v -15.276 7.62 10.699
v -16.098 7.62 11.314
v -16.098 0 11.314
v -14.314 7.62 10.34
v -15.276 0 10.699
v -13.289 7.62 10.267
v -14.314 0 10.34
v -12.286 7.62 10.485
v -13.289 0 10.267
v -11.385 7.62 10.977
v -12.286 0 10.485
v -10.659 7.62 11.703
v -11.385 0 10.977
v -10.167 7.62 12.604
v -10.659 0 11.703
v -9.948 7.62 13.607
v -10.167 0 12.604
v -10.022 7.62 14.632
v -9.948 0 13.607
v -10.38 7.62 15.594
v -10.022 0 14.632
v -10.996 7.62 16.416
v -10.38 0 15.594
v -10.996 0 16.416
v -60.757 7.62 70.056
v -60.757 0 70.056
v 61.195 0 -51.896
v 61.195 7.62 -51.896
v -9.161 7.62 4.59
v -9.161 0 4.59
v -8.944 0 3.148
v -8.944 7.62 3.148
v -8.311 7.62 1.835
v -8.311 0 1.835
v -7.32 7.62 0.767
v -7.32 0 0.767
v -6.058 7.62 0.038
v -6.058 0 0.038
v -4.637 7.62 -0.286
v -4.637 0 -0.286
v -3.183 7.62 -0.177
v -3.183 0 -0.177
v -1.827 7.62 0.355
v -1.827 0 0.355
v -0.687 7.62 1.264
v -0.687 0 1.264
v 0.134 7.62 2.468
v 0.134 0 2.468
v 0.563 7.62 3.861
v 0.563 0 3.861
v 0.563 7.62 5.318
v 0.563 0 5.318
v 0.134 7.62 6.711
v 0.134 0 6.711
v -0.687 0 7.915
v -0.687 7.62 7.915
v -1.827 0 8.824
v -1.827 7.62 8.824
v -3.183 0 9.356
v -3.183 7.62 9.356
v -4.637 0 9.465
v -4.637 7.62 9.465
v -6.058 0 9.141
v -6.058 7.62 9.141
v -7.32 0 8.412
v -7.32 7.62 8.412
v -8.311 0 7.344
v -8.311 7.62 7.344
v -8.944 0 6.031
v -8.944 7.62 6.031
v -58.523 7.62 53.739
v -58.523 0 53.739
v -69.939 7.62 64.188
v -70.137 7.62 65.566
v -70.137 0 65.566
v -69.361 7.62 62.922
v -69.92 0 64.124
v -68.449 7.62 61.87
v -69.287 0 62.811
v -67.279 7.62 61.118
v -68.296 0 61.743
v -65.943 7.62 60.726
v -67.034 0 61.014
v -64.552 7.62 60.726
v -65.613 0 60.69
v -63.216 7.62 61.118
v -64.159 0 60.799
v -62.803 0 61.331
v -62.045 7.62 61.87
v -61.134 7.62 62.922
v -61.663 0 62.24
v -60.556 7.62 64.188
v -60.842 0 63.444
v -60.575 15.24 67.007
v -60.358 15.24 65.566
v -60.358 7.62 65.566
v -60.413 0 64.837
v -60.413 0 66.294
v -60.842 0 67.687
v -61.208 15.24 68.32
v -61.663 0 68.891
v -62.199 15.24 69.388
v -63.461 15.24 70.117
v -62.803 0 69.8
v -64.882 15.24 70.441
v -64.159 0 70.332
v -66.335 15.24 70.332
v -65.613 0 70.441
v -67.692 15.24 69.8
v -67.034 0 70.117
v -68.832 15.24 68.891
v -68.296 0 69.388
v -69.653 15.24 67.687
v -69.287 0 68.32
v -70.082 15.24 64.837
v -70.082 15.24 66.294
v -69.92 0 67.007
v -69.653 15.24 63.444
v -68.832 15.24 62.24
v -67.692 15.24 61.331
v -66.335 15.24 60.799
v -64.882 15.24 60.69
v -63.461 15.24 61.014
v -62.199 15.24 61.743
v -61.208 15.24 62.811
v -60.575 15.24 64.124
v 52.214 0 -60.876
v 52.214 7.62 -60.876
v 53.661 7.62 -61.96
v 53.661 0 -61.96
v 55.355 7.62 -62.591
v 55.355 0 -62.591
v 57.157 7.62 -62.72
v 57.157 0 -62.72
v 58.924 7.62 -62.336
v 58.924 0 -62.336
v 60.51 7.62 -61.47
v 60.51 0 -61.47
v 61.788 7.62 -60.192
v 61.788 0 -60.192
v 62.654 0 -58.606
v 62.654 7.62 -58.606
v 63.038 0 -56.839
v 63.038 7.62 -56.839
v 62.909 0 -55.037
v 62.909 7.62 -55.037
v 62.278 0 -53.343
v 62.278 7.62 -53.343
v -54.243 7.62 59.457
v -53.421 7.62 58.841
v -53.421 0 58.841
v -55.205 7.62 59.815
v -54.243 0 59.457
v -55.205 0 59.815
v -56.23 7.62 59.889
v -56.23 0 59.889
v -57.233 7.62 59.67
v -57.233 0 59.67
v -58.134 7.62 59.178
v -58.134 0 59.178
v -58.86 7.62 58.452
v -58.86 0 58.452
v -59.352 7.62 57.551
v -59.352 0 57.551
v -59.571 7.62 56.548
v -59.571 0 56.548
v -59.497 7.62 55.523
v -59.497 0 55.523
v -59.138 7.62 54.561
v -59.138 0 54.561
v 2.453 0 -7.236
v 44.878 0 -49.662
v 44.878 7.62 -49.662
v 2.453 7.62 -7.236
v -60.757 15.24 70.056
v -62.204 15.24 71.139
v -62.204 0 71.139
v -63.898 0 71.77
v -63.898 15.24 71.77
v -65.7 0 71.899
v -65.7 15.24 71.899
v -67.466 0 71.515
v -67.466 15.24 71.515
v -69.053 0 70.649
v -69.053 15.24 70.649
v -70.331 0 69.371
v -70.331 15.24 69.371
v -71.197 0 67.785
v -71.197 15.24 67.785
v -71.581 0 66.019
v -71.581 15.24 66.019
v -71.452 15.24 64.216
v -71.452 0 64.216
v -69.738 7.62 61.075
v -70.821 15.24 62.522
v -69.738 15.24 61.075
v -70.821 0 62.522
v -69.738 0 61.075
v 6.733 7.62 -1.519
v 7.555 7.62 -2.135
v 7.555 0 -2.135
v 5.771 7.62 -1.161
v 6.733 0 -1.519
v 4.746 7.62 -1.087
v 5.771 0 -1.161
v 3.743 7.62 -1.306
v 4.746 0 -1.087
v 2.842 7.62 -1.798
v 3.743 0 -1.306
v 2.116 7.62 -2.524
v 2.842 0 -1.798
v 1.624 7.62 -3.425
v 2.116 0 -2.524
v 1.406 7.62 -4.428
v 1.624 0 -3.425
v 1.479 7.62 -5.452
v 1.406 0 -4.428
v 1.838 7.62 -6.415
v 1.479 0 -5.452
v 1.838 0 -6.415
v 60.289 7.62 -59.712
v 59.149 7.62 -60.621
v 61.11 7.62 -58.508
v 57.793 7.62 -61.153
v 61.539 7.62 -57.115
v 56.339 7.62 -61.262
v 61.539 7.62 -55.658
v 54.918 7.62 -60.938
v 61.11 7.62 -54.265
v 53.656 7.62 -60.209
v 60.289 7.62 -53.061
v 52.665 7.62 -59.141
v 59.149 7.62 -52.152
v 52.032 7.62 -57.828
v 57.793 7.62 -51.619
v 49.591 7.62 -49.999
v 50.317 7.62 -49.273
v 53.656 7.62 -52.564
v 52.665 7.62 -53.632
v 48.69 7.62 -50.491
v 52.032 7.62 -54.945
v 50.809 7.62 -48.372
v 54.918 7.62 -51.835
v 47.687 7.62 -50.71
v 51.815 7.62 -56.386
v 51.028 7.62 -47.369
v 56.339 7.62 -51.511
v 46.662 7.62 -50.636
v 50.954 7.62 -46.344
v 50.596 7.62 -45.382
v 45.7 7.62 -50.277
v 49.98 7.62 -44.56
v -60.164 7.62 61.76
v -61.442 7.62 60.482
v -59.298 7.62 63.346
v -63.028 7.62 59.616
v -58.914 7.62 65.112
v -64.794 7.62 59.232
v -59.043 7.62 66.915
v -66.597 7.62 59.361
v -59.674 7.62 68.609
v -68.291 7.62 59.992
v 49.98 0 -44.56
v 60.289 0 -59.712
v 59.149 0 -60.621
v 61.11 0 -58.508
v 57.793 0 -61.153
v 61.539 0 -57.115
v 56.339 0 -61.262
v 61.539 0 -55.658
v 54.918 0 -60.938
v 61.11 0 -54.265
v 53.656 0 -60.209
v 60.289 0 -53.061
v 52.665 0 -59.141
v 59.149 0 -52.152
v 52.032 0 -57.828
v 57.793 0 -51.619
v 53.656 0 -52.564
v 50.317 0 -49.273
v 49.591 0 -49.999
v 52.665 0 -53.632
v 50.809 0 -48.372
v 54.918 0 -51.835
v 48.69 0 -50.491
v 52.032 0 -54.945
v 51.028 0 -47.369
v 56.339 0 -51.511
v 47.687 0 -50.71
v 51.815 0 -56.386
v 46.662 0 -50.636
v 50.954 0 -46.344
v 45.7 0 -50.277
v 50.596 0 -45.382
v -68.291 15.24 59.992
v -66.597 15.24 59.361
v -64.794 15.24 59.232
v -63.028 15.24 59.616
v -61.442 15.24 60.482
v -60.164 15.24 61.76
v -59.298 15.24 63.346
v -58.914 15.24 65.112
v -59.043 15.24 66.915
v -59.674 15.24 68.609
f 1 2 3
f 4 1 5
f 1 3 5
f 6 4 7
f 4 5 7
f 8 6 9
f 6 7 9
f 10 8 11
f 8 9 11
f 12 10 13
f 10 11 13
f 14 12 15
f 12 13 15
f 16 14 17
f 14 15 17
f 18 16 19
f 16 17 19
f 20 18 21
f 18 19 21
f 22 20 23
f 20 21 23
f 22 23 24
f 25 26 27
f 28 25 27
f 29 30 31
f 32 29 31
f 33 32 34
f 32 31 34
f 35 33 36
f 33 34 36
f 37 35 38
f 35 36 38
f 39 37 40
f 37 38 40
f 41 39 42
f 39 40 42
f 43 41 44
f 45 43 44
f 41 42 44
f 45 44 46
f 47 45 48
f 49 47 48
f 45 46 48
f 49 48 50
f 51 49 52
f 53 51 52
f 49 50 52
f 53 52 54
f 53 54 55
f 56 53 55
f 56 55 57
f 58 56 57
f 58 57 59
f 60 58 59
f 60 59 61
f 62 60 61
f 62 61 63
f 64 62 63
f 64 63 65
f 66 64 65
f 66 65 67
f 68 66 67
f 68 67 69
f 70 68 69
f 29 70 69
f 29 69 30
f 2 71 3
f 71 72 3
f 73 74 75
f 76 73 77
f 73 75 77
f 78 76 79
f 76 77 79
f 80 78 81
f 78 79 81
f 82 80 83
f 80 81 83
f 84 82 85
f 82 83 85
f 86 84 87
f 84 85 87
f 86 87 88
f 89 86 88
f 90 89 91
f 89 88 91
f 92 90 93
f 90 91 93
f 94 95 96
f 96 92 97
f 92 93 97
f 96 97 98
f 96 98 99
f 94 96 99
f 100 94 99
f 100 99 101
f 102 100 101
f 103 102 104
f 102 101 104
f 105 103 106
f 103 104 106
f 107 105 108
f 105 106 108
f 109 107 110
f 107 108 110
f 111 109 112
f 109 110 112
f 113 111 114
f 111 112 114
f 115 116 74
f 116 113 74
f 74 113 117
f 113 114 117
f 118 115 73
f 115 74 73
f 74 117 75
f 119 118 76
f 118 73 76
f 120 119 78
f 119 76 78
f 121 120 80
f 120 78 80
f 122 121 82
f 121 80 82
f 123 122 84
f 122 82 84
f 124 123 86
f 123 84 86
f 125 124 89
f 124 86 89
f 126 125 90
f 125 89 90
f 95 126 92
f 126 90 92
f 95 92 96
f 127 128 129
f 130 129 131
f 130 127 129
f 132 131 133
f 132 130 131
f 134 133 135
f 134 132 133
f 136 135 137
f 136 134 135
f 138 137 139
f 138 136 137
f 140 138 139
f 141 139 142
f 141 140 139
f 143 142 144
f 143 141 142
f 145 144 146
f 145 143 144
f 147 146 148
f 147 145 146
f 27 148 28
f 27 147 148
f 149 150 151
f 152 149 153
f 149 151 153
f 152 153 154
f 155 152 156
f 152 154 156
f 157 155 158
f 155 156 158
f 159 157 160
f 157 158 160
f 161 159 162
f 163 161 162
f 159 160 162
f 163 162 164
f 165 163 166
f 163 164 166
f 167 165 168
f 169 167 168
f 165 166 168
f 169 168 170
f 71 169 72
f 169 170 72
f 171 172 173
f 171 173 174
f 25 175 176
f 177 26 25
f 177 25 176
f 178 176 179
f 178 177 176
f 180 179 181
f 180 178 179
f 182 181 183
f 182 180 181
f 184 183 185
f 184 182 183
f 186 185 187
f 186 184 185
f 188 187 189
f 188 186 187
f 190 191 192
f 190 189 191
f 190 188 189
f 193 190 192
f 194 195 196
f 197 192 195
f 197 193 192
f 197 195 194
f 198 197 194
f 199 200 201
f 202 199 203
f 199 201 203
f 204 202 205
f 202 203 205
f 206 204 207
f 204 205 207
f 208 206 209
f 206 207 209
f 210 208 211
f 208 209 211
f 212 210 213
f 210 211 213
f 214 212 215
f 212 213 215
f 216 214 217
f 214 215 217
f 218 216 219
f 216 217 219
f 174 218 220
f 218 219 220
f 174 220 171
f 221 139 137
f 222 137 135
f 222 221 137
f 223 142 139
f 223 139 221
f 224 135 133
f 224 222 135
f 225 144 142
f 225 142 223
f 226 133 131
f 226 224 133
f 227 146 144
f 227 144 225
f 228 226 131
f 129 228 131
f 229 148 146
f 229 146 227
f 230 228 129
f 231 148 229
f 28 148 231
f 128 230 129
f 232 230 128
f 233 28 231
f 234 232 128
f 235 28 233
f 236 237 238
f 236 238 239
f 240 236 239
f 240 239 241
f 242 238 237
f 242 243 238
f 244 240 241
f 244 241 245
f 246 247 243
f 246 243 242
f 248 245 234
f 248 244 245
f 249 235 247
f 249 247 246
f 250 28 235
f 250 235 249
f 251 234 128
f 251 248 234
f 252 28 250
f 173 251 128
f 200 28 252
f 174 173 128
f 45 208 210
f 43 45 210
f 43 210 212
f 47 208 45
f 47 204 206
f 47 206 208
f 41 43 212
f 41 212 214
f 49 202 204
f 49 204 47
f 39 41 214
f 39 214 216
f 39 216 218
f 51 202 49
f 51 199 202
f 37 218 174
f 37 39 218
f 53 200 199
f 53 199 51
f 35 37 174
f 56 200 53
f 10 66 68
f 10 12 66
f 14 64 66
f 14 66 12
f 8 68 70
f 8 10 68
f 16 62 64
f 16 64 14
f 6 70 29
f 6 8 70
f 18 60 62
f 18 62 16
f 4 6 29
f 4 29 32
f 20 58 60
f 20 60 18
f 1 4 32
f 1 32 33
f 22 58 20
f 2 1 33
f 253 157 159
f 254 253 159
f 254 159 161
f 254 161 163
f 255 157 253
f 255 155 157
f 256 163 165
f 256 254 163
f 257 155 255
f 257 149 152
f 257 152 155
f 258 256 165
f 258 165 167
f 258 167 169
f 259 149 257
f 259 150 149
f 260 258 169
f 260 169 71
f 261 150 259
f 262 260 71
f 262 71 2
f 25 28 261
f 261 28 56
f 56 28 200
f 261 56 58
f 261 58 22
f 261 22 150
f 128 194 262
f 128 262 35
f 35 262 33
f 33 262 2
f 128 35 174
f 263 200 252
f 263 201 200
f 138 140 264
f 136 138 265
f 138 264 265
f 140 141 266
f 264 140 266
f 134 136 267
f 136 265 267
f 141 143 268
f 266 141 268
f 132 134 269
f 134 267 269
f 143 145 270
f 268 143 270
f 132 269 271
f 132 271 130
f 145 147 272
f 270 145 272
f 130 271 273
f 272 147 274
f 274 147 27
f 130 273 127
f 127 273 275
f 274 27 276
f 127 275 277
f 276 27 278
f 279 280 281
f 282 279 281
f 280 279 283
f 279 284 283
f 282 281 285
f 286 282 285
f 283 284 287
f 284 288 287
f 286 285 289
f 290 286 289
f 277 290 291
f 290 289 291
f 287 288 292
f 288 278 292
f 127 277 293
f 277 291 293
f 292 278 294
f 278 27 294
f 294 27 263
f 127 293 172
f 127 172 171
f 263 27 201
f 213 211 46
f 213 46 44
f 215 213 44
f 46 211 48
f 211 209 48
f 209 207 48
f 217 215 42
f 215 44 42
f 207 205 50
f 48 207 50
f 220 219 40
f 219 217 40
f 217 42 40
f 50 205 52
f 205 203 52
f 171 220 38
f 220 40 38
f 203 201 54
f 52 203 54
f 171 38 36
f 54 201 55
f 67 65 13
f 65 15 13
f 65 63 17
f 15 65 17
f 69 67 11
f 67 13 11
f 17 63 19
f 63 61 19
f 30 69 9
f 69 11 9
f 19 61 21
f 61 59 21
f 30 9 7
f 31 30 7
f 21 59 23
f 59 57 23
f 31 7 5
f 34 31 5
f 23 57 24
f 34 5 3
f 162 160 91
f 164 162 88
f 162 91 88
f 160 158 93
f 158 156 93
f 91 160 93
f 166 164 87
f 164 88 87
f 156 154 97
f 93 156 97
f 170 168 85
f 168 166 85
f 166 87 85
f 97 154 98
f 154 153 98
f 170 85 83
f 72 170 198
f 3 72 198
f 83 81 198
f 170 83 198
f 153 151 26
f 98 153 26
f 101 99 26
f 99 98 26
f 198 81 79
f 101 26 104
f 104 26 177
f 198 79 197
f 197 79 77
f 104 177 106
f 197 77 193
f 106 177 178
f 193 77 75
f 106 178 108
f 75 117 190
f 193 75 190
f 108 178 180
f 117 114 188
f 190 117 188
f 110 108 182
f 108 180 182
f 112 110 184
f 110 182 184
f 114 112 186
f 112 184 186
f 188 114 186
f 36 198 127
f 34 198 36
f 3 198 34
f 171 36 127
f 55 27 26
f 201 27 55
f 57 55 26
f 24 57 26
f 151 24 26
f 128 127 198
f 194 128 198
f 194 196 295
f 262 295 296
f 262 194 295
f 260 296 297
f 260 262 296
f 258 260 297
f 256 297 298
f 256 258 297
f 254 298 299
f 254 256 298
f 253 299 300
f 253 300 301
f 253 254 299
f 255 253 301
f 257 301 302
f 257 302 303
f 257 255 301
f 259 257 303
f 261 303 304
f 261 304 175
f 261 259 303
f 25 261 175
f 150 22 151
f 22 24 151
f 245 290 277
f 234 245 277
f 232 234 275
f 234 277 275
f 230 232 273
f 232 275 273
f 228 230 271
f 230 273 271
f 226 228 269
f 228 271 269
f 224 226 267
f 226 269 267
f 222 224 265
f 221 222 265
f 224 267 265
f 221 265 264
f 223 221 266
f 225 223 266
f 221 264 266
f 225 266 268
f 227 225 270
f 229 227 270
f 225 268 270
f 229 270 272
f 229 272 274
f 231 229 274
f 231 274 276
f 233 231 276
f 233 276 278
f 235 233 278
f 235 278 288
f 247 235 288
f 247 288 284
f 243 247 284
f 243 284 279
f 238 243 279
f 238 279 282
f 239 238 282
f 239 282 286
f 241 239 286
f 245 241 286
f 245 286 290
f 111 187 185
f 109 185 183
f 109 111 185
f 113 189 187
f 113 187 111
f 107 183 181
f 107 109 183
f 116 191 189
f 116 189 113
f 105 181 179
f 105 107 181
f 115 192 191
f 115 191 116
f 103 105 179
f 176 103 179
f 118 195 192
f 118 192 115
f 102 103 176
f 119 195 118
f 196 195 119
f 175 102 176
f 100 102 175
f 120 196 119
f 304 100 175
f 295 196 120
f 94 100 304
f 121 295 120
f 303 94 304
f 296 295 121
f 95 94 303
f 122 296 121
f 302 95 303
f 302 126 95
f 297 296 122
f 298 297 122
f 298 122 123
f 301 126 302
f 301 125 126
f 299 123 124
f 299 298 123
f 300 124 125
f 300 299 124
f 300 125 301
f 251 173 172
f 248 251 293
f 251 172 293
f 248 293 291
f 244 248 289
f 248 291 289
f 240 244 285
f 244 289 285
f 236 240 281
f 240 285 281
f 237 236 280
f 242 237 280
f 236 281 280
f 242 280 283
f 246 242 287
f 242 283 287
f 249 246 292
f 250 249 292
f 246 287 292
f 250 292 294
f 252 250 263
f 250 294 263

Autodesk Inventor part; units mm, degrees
ref_plane "YZ Plane" through (0, 0, 0) normal (1, 0, 0) x (0, 1, 0)
ref_plane "XZ Plane" through (0, 0, 0) normal (0, 1, 0) x (-1, 0, 0)
ref_plane "XY Plane" through (0, 0, 0) normal (0, 0, 1) x (1, 0, 0)
sketch "Sketch1" plane through (0, 0, 0) normal (0, 1, 0) x (-1, 0, 0)
  circle A0 centre (-56.7045, -56.3864) radius 4.8895
  circle A1 centre (-56.7045, -56.3864) radius 4.8895
  line L0 (-52.2143, -60.8765) -> (69.7375, 61.0754)
  line L1 (60.7573, 70.0556) -> (-61.1946, -51.8963)
  arc A2 (-61.1946, -51.8963) -> (-52.2143, -60.8765) centre (-56.7045, -56.3864) ccw
  arc A3 (69.7375, 61.0754) -> (60.7573, 70.0556) centre (65.2474, 65.5655) ccw
  circle A4 centre (4.2715, 4.5895) radius 4.8895
  circle A5 centre (65.2474, 65.5655) radius 4.8895
  line L2 (7.7289, 8.0469) -> (61.79, 62.1081)
  line L3 (68.7048, 69.0229) -> (69.7375, 70.0556)
  line L4 (-53.2471, -52.929) -> (0.8141, 1.1322) construction
  line L5 (7.7289, 8.0469) -> (61.79, 62.1081) construction
  line L6 (0.8141, 1.1322) -> (-53.2471, -52.929)
  line L7 (-60.1619, -59.8438) -> (-61.1946, -60.8765)
  line L8 (-5.0037, -4.6857) -> (-47.4293, -47.1112) construction
  line L9 (-7.5546, -2.1348) -> (-49.9802, -44.5603)
  line L10 (-44.8784, -49.6621) -> (-2.4529, -7.2365)
  arc A6 (-2.4529, -7.2365) -> (-7.5546, -2.1348) centre (-5.0037, -4.6857) ccw
  arc A7 (-49.9802, -44.5603) -> (-44.8784, -49.6621) centre (-47.4293, -47.1112) ccw
  line L11 (4.2715, 4.5895) -> (-0.2187, 9.0797)
  arc A8 (10.9958, 16.4156) -> (16.0976, 11.3139) centre (13.5467, 13.8648) ccw
  line L12 (10.9958, 16.4156) -> (53.4213, 58.8412)
  line L13 (58.5231, 53.7394) -> (16.0976, 11.3139)
  arc A9 (58.5231, 53.7394) -> (53.4213, 58.8412) centre (55.9722, 56.2903) ccw
  point P0 (0, 0)
  point P1 (29.6663, 4.6577)
  point P2 (-26.2165, -25.8984)
  dimension "d0" = 172.466
  dimension "d1" = 12.7
  dimension "d2" = 9.779
  dimension "d3" = 9.779
  dimension "d4" = 9.779
extrude "Extrusion1" add sketch "Sketch1" along normal blind 7.62 contours A0 L6 A7 L10 A6 A4 L2 A8 L13 A9 A5 L3 A3 L0 A2 L7 | A0 L7 A2 L1 L11 A4 L6 A6 L9 A7 | L1 A3 L3 A5 L2 A9 L12 A8 A4 L11
sketch "Sketch2" plane through (0, 7.62, 0) normal (0, 1, 0) x (1, 0, 0)
  line L0 (-60.7573, -70.0556) -> (61.1946, 51.8963) projected
  arc A0 (61.1946, 51.8963) -> (52.2143, 60.8765) centre (56.7045, 56.3864) ccw projected
  line L1 (52.2143, 60.8765) -> (-69.7375, -61.0754) projected
  arc A1 (-69.7375, -61.0754) -> (-60.7573, -70.0556) centre (-65.2474, -65.5655) ccw projected
  arc A2 (-58.5231, -53.7394) -> (-53.4213, -58.8412) centre (-55.9722, -56.2903) ccw projected
  line L2 (-58.5231, -53.7394) -> (-16.0976, -11.3139) projected
  arc A3 (-10.9958, -16.4156) -> (-16.0976, -11.3139) centre (-13.5467, -13.8648) ccw projected
  line L3 (-10.9958, -16.4156) -> (-53.4213, -58.8412) projected
  circle A4 centre (-65.2474, -65.5655) radius 4.8895 projected
  circle A5 centre (-4.2715, -4.5895) radius 4.8895 projected
  circle A6 centre (56.7045, 56.3864) radius 4.8895 projected
  arc A7 (49.9802, 44.5603) -> (44.8784, 49.6621) centre (47.4293, 47.1112) ccw projected
  line L4 (49.9802, 44.5603) -> (7.5546, 2.1348) projected
  arc A8 (2.4529, 7.2365) -> (7.5546, 2.1348) centre (5.0037, 4.6857) ccw projected
  line L5 (2.4529, 7.2365) -> (44.8784, 49.6621) projected
  circle A9 centre (-65.2474, -65.5655) radius 6.35
  point P0 (0, 0)
extrude "Extrusion2" add sketch "Sketch2" along normal blind 7.62 contours A1 A9
properties part number "Bump Arm"
